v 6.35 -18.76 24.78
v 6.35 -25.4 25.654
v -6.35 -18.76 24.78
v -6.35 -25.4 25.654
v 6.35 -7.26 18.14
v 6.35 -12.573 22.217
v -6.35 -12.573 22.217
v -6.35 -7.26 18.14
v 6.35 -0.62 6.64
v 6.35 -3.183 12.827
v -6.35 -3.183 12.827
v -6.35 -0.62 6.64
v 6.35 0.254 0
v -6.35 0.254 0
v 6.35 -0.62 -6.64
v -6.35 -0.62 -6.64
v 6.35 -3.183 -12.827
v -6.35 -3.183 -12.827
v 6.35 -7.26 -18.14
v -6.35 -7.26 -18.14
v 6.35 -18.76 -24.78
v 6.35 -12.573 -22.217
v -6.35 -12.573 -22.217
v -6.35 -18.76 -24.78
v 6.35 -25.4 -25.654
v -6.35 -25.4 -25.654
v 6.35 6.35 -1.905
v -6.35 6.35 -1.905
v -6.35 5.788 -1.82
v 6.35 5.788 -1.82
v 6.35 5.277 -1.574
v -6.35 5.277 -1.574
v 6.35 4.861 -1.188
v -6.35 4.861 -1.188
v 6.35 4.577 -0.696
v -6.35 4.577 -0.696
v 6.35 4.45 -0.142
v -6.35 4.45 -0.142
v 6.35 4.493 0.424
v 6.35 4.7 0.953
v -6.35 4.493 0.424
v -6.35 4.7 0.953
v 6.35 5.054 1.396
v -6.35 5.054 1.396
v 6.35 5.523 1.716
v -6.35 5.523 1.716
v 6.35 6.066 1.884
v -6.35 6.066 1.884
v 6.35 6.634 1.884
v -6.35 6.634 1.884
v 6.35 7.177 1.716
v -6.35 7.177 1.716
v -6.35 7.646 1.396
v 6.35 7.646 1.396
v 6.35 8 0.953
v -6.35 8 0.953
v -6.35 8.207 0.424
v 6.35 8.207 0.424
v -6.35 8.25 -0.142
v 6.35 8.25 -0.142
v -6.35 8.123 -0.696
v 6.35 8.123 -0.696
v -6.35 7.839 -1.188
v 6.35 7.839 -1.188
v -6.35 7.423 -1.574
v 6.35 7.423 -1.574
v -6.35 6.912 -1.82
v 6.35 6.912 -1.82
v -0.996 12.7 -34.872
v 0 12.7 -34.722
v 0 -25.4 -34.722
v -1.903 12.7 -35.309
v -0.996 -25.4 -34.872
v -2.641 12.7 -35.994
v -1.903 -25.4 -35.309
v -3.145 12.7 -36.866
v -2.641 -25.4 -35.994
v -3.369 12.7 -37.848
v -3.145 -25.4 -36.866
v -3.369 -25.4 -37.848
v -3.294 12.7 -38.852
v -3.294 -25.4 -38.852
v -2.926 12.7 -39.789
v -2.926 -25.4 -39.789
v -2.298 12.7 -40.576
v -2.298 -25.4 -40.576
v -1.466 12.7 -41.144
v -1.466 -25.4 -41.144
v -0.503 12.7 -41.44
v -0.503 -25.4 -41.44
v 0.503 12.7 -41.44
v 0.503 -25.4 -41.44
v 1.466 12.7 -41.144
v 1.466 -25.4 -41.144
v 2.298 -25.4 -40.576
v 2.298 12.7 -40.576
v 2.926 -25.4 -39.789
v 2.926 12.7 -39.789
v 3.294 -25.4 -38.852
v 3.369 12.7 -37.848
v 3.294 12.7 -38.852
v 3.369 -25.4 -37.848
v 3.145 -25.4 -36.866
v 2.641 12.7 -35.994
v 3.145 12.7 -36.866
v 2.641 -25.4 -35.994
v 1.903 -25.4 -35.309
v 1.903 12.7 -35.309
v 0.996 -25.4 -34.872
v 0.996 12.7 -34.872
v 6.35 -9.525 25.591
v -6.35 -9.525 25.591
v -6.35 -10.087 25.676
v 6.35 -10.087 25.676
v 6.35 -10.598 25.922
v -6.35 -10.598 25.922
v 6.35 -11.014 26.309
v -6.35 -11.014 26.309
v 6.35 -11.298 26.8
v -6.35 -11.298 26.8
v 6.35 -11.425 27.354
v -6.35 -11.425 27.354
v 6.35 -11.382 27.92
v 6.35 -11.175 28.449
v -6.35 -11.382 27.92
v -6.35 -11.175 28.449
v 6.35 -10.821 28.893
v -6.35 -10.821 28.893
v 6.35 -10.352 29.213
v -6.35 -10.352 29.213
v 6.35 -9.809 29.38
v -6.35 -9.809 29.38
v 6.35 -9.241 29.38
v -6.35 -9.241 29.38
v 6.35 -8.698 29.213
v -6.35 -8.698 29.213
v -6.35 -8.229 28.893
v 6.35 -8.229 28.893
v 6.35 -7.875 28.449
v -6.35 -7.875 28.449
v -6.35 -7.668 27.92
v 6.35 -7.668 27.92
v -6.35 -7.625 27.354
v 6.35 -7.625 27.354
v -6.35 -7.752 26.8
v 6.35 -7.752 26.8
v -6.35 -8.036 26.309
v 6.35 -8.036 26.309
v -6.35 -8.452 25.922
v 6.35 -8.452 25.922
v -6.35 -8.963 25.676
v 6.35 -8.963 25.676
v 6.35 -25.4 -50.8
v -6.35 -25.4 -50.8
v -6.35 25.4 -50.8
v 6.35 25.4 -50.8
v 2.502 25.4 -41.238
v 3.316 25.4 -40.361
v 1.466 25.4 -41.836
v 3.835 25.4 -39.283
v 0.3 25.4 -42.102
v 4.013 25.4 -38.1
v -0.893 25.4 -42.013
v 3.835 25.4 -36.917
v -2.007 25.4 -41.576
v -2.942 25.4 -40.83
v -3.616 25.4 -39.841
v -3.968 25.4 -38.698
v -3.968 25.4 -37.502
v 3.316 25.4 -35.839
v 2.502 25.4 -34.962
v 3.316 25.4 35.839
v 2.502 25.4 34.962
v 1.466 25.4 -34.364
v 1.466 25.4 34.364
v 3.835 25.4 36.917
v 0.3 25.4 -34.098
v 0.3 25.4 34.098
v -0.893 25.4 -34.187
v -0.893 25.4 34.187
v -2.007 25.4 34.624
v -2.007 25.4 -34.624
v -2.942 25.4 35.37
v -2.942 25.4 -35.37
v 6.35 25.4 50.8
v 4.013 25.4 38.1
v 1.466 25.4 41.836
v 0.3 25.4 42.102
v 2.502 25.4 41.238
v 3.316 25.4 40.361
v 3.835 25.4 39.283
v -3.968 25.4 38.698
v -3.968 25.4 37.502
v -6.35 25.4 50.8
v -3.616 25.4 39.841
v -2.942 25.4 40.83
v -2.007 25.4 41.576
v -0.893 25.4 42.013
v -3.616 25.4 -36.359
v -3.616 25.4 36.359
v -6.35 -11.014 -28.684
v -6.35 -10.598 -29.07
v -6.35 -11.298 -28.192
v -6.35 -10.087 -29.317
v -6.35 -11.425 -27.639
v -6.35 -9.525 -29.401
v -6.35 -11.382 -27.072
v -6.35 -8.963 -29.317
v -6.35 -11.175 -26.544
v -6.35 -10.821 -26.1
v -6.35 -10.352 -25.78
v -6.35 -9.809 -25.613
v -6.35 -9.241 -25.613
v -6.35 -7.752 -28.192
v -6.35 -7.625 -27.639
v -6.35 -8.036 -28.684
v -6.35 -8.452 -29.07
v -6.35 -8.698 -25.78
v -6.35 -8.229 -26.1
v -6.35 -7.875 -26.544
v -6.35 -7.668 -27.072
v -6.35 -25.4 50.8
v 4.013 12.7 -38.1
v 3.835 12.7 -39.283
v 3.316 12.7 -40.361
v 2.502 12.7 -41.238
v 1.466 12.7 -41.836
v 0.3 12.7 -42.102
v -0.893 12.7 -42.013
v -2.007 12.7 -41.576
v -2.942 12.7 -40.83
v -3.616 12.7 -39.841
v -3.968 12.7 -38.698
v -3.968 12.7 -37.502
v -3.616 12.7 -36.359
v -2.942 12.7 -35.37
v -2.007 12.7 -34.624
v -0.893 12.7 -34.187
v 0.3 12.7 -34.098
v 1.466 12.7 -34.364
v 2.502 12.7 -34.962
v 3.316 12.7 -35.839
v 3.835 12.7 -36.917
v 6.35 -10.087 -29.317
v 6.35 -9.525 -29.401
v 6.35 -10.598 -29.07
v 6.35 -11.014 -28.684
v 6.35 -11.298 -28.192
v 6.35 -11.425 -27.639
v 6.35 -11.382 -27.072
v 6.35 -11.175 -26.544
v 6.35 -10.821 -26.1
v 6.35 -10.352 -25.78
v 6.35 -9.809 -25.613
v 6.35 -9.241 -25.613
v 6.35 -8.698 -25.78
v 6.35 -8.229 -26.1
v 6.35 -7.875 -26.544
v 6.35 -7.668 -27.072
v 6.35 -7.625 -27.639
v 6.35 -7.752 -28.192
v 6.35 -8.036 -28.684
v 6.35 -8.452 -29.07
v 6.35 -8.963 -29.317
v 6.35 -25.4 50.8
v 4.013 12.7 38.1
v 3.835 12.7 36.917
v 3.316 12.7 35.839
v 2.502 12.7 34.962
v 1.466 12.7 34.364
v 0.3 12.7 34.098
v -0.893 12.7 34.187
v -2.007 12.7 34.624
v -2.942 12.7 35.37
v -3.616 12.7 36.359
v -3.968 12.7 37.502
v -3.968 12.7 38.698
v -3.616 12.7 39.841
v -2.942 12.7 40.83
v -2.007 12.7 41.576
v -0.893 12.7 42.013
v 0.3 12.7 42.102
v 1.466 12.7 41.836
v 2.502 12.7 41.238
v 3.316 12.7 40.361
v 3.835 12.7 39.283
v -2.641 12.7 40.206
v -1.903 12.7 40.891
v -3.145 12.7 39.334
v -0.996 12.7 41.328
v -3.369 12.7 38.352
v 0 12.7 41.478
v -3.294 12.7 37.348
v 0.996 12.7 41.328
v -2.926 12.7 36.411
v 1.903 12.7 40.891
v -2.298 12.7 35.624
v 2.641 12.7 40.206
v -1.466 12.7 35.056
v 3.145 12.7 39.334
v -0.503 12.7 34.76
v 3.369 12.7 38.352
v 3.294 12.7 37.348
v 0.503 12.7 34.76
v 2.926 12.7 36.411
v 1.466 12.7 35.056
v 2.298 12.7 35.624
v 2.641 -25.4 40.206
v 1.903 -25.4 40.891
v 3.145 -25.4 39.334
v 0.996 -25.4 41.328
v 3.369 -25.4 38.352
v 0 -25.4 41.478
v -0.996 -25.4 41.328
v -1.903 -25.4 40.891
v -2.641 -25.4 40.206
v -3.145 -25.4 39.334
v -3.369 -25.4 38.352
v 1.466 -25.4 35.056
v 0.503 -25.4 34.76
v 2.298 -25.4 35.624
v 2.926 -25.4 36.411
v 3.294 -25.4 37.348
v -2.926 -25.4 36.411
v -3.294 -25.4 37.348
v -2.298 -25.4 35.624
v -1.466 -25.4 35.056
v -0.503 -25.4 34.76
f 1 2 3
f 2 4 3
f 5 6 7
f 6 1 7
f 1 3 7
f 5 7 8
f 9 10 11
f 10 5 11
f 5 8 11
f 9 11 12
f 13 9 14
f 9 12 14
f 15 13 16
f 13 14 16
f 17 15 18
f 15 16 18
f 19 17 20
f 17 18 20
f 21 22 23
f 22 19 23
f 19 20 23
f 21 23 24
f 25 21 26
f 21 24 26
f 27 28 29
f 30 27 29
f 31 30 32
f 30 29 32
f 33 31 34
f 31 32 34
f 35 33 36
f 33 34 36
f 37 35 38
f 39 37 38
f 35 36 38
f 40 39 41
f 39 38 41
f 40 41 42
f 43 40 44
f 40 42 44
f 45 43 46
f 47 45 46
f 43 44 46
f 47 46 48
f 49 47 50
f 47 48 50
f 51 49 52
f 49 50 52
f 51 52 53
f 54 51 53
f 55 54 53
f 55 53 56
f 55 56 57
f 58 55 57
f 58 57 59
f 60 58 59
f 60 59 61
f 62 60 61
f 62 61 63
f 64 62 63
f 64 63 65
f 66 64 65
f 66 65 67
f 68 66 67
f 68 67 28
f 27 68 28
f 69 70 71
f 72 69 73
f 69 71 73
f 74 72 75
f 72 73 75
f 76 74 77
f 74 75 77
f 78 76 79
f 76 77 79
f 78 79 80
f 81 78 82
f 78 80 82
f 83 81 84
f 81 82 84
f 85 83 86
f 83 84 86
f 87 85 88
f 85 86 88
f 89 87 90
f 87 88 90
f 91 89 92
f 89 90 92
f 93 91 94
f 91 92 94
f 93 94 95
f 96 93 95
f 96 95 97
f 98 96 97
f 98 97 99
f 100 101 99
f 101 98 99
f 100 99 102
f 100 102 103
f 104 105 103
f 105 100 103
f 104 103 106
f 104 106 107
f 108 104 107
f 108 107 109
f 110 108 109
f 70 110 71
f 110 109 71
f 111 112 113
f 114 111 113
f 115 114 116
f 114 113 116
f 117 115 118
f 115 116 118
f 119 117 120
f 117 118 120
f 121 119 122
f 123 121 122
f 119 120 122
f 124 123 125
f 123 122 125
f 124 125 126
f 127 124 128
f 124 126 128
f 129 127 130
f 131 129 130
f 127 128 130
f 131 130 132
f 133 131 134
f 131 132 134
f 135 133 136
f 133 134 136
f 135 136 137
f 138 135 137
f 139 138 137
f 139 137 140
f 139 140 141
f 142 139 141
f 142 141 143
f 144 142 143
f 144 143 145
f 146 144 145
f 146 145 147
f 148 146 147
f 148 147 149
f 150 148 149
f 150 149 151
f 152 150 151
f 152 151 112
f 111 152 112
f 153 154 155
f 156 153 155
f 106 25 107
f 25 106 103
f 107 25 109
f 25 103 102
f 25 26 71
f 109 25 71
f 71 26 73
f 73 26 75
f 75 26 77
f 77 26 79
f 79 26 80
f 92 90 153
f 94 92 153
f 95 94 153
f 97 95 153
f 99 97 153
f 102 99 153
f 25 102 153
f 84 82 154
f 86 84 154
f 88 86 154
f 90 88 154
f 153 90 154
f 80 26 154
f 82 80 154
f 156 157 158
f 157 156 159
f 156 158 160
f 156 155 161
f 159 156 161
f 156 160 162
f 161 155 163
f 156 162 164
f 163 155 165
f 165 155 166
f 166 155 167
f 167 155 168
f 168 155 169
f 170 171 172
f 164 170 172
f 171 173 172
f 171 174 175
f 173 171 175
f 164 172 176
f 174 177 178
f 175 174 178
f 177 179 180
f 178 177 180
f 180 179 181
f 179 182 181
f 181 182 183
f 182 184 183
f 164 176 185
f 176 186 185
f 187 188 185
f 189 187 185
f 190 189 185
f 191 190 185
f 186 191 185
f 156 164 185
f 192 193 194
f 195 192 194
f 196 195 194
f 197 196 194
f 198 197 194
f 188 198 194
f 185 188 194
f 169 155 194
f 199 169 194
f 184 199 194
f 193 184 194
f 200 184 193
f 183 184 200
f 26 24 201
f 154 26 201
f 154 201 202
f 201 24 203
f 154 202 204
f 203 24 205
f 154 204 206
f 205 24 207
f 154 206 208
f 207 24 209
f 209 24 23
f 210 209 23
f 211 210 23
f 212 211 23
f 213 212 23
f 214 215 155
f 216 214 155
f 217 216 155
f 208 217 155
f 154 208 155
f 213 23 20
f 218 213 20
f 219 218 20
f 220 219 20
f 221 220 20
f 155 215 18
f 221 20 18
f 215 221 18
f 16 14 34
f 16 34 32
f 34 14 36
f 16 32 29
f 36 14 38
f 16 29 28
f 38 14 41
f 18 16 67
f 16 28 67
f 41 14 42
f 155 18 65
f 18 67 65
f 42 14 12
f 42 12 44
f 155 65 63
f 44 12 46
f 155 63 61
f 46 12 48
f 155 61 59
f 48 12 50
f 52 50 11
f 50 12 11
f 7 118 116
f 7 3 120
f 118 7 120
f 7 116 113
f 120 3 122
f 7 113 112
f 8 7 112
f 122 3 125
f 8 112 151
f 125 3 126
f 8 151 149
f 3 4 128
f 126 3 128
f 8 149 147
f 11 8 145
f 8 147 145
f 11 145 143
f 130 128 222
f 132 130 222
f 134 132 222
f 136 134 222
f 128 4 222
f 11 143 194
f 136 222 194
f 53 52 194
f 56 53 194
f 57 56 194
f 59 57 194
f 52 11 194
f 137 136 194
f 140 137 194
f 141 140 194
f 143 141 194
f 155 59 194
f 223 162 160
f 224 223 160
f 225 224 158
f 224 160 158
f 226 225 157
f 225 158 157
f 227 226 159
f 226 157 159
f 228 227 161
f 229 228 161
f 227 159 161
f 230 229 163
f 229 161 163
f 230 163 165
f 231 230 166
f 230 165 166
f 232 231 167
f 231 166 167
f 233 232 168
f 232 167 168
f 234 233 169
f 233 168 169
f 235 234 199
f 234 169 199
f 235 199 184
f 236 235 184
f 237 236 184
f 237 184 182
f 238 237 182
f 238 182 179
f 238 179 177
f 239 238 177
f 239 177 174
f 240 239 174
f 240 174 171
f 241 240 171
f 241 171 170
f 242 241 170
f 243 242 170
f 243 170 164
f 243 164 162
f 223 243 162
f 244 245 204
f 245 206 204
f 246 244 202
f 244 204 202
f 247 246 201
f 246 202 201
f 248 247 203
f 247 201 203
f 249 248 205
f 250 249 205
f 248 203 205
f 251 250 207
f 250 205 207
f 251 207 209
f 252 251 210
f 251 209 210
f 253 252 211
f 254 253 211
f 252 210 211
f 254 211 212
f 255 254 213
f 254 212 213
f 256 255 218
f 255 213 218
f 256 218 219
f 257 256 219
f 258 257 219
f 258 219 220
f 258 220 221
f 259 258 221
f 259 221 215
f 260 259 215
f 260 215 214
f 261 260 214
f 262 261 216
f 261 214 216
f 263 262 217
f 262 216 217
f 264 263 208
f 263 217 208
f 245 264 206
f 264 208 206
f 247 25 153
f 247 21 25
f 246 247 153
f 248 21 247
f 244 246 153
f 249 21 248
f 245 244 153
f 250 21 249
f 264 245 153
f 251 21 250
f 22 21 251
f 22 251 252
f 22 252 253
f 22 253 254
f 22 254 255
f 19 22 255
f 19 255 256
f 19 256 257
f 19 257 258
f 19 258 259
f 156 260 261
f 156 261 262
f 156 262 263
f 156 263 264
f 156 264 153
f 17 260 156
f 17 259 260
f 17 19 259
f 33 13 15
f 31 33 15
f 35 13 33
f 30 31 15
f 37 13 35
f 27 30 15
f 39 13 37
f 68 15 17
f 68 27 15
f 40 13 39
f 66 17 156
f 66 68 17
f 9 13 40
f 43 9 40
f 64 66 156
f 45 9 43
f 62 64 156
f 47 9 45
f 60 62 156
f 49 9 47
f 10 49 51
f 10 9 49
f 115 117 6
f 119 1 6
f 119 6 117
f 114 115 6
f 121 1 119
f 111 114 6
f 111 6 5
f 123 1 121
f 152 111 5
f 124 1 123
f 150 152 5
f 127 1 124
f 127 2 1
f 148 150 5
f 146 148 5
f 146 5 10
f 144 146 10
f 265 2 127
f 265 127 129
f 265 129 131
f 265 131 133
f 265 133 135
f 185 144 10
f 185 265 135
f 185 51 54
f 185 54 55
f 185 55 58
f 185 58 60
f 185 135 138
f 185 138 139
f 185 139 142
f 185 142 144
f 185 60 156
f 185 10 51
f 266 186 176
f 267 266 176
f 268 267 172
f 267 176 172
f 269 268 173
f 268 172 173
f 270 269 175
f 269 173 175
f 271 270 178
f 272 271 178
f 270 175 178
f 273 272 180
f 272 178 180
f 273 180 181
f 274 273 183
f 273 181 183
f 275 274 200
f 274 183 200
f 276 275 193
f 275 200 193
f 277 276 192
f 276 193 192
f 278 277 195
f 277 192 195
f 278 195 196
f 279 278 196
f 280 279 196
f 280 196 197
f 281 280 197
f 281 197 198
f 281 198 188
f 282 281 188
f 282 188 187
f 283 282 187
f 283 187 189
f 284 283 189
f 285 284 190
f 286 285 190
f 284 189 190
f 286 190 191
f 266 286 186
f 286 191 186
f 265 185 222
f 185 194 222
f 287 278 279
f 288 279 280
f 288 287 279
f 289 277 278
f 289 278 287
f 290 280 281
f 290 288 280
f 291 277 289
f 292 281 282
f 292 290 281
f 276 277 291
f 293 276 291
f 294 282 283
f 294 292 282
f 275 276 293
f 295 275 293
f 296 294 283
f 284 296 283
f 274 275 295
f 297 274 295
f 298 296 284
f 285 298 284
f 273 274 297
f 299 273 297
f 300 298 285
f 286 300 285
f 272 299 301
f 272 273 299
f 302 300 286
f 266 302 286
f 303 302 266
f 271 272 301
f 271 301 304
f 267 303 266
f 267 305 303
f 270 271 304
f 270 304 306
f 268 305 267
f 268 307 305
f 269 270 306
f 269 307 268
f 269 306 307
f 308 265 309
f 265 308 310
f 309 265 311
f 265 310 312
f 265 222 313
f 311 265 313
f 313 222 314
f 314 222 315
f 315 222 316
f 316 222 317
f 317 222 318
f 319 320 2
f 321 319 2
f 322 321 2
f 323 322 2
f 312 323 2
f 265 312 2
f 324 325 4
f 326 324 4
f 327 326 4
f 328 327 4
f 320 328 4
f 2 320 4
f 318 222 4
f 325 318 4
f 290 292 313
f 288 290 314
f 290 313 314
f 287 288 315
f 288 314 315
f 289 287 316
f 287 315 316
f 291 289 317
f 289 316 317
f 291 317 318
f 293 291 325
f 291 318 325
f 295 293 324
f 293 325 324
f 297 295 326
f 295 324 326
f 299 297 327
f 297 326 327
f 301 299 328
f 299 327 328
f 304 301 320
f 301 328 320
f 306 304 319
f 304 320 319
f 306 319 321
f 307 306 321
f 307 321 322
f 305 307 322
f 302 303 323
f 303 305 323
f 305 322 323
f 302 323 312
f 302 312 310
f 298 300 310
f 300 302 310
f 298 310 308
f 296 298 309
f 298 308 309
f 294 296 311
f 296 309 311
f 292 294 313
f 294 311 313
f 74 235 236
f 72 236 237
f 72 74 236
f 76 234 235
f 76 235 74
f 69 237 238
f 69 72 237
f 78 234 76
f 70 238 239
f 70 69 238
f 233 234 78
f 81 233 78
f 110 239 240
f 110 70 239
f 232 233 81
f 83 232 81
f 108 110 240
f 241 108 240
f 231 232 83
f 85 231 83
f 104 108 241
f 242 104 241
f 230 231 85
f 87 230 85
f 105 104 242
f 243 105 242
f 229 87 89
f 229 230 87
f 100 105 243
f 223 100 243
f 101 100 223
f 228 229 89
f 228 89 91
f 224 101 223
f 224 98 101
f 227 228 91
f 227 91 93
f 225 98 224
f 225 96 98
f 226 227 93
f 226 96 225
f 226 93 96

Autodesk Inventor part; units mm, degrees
ref_plane "YZ Plane" through (0, 0, 0) normal (1, 0, 0) x (0, 1, 0)
ref_plane "XZ Plane" through (0, 0, 0) normal (0, 1, 0) x (-1, 0, 0)
ref_plane "XY Plane" through (0, 0, 0) normal (0, 0, 1) x (1, 0, 0)
sketch "Sketch1" plane through (0, 0, 0) normal (1, 0, 0) x (0, 1, 0)
  line L0 (-25.4, -50.8) -> (25.4, -50.8)
  line L1 (25.4, -50.8) -> (25.4, 50.8)
  line L2 (25.4, 50.8) -> (-25.4, 50.8)
  line L3 (-25.4, 50.8) -> (25.4, -50.8) construction
  line L4 (-25.4, -50.8) -> (25.4, 50.8) construction
  arc A0 (-25.4, -25.654) -> (-25.4, 25.654) centre (-25.4, 0) ccw
  line L5 (-25.4, 50.8) -> (-25.4, 25.654)
  line L6 (-25.4, -25.654) -> (-25.4, -50.8)
  point P0 (0, 0)
  dimension "d0" = 101.6
  dimension "d1" = 50.8
  dimension "d2" = 51.308
  dimension "d6" = 50.8
  dimension "d7" = 50.8
extrude "Extrusion1" add sketch "Sketch1" along normal mid plane 12.7
sketch "Sketch3" plane through (6.35, 0, 0) normal (1, 0, 0) x (0, 0, -1)
  circle A0 centre (0, -25.4) radius 31.75 construction
  point P0 (0, 0)
  point P1 (0, 6.35)
  point P2 (0, 6.35)
  point P3 (-27.4963, -9.525)
  point P4 (-27.4963, -41.275)
  point P5 (0, -57.15)
  point P6 (27.4963, -41.275)
  point P7 (27.4963, -9.525)
  dimension "d17" = 360
hole "Hole2" at (6.35, 6.35, 0) at (6.35, -9.525, 27.4963) at (6.35, -41.275, 27.4963) at (6.35, -57.15, 0) at (6.35, -41.275, -27.4963) at (6.35, -9.525, -27.4963) direction (-1, 0, 0) diameter 3.81 end through all clearance for "Flat Head Machine Screw (82)" size "#6" standard "Ansi Unified Screw Threads"
sketch "Sketch4" plane through (-6.35, 25.4, 50.8) normal (0, 1, 0) x (1, 0, 0)
  line L0 (12.7, 0) -> (0, 0) construction
  line L1 (6.35, 0) -> (6.35, 101.6) construction
  line L2 (12.7, 101.6) -> (0, 101.6) construction
  point P0 (6.35, 50.8)
  point P1 (6.35, 12.7)
  point P2 (6.35, 88.9)
  dimension "d26" = 12.7
  dimension "d27" = 12.7
hole "Hole3" at (0, 25.4, 38.1) at (0, 25.4, -38.1) direction (0, -1, 0) diameter 6.7564 end through all clearance for "Flat Head Machine Screw (82)" size "1/4" standard "Ansi Unified Screw Threads"
sketch "Sketch5" plane through (-6.35, 25.4, 50.8) normal (0, 1, 0) x (1, 0, 0)
  circle A0 centre (6.35, 88.9) radius 3.3782 projected
  circle A1 centre (6.35, 88.9) radius 4.0132
  circle A2 centre (6.35, 12.7) radius 3.3782 projected
  circle A3 centre (6.35, 12.7) radius 4.0132
  point P0 (6.35, 50.8)
  dimension "d35" = 8.0264
extrude "Extrusion2" cut sketch "Sketch5" against normal blind 12.7
properties part number "BottomOfSupportForAxel" material "PBT Plastic"
